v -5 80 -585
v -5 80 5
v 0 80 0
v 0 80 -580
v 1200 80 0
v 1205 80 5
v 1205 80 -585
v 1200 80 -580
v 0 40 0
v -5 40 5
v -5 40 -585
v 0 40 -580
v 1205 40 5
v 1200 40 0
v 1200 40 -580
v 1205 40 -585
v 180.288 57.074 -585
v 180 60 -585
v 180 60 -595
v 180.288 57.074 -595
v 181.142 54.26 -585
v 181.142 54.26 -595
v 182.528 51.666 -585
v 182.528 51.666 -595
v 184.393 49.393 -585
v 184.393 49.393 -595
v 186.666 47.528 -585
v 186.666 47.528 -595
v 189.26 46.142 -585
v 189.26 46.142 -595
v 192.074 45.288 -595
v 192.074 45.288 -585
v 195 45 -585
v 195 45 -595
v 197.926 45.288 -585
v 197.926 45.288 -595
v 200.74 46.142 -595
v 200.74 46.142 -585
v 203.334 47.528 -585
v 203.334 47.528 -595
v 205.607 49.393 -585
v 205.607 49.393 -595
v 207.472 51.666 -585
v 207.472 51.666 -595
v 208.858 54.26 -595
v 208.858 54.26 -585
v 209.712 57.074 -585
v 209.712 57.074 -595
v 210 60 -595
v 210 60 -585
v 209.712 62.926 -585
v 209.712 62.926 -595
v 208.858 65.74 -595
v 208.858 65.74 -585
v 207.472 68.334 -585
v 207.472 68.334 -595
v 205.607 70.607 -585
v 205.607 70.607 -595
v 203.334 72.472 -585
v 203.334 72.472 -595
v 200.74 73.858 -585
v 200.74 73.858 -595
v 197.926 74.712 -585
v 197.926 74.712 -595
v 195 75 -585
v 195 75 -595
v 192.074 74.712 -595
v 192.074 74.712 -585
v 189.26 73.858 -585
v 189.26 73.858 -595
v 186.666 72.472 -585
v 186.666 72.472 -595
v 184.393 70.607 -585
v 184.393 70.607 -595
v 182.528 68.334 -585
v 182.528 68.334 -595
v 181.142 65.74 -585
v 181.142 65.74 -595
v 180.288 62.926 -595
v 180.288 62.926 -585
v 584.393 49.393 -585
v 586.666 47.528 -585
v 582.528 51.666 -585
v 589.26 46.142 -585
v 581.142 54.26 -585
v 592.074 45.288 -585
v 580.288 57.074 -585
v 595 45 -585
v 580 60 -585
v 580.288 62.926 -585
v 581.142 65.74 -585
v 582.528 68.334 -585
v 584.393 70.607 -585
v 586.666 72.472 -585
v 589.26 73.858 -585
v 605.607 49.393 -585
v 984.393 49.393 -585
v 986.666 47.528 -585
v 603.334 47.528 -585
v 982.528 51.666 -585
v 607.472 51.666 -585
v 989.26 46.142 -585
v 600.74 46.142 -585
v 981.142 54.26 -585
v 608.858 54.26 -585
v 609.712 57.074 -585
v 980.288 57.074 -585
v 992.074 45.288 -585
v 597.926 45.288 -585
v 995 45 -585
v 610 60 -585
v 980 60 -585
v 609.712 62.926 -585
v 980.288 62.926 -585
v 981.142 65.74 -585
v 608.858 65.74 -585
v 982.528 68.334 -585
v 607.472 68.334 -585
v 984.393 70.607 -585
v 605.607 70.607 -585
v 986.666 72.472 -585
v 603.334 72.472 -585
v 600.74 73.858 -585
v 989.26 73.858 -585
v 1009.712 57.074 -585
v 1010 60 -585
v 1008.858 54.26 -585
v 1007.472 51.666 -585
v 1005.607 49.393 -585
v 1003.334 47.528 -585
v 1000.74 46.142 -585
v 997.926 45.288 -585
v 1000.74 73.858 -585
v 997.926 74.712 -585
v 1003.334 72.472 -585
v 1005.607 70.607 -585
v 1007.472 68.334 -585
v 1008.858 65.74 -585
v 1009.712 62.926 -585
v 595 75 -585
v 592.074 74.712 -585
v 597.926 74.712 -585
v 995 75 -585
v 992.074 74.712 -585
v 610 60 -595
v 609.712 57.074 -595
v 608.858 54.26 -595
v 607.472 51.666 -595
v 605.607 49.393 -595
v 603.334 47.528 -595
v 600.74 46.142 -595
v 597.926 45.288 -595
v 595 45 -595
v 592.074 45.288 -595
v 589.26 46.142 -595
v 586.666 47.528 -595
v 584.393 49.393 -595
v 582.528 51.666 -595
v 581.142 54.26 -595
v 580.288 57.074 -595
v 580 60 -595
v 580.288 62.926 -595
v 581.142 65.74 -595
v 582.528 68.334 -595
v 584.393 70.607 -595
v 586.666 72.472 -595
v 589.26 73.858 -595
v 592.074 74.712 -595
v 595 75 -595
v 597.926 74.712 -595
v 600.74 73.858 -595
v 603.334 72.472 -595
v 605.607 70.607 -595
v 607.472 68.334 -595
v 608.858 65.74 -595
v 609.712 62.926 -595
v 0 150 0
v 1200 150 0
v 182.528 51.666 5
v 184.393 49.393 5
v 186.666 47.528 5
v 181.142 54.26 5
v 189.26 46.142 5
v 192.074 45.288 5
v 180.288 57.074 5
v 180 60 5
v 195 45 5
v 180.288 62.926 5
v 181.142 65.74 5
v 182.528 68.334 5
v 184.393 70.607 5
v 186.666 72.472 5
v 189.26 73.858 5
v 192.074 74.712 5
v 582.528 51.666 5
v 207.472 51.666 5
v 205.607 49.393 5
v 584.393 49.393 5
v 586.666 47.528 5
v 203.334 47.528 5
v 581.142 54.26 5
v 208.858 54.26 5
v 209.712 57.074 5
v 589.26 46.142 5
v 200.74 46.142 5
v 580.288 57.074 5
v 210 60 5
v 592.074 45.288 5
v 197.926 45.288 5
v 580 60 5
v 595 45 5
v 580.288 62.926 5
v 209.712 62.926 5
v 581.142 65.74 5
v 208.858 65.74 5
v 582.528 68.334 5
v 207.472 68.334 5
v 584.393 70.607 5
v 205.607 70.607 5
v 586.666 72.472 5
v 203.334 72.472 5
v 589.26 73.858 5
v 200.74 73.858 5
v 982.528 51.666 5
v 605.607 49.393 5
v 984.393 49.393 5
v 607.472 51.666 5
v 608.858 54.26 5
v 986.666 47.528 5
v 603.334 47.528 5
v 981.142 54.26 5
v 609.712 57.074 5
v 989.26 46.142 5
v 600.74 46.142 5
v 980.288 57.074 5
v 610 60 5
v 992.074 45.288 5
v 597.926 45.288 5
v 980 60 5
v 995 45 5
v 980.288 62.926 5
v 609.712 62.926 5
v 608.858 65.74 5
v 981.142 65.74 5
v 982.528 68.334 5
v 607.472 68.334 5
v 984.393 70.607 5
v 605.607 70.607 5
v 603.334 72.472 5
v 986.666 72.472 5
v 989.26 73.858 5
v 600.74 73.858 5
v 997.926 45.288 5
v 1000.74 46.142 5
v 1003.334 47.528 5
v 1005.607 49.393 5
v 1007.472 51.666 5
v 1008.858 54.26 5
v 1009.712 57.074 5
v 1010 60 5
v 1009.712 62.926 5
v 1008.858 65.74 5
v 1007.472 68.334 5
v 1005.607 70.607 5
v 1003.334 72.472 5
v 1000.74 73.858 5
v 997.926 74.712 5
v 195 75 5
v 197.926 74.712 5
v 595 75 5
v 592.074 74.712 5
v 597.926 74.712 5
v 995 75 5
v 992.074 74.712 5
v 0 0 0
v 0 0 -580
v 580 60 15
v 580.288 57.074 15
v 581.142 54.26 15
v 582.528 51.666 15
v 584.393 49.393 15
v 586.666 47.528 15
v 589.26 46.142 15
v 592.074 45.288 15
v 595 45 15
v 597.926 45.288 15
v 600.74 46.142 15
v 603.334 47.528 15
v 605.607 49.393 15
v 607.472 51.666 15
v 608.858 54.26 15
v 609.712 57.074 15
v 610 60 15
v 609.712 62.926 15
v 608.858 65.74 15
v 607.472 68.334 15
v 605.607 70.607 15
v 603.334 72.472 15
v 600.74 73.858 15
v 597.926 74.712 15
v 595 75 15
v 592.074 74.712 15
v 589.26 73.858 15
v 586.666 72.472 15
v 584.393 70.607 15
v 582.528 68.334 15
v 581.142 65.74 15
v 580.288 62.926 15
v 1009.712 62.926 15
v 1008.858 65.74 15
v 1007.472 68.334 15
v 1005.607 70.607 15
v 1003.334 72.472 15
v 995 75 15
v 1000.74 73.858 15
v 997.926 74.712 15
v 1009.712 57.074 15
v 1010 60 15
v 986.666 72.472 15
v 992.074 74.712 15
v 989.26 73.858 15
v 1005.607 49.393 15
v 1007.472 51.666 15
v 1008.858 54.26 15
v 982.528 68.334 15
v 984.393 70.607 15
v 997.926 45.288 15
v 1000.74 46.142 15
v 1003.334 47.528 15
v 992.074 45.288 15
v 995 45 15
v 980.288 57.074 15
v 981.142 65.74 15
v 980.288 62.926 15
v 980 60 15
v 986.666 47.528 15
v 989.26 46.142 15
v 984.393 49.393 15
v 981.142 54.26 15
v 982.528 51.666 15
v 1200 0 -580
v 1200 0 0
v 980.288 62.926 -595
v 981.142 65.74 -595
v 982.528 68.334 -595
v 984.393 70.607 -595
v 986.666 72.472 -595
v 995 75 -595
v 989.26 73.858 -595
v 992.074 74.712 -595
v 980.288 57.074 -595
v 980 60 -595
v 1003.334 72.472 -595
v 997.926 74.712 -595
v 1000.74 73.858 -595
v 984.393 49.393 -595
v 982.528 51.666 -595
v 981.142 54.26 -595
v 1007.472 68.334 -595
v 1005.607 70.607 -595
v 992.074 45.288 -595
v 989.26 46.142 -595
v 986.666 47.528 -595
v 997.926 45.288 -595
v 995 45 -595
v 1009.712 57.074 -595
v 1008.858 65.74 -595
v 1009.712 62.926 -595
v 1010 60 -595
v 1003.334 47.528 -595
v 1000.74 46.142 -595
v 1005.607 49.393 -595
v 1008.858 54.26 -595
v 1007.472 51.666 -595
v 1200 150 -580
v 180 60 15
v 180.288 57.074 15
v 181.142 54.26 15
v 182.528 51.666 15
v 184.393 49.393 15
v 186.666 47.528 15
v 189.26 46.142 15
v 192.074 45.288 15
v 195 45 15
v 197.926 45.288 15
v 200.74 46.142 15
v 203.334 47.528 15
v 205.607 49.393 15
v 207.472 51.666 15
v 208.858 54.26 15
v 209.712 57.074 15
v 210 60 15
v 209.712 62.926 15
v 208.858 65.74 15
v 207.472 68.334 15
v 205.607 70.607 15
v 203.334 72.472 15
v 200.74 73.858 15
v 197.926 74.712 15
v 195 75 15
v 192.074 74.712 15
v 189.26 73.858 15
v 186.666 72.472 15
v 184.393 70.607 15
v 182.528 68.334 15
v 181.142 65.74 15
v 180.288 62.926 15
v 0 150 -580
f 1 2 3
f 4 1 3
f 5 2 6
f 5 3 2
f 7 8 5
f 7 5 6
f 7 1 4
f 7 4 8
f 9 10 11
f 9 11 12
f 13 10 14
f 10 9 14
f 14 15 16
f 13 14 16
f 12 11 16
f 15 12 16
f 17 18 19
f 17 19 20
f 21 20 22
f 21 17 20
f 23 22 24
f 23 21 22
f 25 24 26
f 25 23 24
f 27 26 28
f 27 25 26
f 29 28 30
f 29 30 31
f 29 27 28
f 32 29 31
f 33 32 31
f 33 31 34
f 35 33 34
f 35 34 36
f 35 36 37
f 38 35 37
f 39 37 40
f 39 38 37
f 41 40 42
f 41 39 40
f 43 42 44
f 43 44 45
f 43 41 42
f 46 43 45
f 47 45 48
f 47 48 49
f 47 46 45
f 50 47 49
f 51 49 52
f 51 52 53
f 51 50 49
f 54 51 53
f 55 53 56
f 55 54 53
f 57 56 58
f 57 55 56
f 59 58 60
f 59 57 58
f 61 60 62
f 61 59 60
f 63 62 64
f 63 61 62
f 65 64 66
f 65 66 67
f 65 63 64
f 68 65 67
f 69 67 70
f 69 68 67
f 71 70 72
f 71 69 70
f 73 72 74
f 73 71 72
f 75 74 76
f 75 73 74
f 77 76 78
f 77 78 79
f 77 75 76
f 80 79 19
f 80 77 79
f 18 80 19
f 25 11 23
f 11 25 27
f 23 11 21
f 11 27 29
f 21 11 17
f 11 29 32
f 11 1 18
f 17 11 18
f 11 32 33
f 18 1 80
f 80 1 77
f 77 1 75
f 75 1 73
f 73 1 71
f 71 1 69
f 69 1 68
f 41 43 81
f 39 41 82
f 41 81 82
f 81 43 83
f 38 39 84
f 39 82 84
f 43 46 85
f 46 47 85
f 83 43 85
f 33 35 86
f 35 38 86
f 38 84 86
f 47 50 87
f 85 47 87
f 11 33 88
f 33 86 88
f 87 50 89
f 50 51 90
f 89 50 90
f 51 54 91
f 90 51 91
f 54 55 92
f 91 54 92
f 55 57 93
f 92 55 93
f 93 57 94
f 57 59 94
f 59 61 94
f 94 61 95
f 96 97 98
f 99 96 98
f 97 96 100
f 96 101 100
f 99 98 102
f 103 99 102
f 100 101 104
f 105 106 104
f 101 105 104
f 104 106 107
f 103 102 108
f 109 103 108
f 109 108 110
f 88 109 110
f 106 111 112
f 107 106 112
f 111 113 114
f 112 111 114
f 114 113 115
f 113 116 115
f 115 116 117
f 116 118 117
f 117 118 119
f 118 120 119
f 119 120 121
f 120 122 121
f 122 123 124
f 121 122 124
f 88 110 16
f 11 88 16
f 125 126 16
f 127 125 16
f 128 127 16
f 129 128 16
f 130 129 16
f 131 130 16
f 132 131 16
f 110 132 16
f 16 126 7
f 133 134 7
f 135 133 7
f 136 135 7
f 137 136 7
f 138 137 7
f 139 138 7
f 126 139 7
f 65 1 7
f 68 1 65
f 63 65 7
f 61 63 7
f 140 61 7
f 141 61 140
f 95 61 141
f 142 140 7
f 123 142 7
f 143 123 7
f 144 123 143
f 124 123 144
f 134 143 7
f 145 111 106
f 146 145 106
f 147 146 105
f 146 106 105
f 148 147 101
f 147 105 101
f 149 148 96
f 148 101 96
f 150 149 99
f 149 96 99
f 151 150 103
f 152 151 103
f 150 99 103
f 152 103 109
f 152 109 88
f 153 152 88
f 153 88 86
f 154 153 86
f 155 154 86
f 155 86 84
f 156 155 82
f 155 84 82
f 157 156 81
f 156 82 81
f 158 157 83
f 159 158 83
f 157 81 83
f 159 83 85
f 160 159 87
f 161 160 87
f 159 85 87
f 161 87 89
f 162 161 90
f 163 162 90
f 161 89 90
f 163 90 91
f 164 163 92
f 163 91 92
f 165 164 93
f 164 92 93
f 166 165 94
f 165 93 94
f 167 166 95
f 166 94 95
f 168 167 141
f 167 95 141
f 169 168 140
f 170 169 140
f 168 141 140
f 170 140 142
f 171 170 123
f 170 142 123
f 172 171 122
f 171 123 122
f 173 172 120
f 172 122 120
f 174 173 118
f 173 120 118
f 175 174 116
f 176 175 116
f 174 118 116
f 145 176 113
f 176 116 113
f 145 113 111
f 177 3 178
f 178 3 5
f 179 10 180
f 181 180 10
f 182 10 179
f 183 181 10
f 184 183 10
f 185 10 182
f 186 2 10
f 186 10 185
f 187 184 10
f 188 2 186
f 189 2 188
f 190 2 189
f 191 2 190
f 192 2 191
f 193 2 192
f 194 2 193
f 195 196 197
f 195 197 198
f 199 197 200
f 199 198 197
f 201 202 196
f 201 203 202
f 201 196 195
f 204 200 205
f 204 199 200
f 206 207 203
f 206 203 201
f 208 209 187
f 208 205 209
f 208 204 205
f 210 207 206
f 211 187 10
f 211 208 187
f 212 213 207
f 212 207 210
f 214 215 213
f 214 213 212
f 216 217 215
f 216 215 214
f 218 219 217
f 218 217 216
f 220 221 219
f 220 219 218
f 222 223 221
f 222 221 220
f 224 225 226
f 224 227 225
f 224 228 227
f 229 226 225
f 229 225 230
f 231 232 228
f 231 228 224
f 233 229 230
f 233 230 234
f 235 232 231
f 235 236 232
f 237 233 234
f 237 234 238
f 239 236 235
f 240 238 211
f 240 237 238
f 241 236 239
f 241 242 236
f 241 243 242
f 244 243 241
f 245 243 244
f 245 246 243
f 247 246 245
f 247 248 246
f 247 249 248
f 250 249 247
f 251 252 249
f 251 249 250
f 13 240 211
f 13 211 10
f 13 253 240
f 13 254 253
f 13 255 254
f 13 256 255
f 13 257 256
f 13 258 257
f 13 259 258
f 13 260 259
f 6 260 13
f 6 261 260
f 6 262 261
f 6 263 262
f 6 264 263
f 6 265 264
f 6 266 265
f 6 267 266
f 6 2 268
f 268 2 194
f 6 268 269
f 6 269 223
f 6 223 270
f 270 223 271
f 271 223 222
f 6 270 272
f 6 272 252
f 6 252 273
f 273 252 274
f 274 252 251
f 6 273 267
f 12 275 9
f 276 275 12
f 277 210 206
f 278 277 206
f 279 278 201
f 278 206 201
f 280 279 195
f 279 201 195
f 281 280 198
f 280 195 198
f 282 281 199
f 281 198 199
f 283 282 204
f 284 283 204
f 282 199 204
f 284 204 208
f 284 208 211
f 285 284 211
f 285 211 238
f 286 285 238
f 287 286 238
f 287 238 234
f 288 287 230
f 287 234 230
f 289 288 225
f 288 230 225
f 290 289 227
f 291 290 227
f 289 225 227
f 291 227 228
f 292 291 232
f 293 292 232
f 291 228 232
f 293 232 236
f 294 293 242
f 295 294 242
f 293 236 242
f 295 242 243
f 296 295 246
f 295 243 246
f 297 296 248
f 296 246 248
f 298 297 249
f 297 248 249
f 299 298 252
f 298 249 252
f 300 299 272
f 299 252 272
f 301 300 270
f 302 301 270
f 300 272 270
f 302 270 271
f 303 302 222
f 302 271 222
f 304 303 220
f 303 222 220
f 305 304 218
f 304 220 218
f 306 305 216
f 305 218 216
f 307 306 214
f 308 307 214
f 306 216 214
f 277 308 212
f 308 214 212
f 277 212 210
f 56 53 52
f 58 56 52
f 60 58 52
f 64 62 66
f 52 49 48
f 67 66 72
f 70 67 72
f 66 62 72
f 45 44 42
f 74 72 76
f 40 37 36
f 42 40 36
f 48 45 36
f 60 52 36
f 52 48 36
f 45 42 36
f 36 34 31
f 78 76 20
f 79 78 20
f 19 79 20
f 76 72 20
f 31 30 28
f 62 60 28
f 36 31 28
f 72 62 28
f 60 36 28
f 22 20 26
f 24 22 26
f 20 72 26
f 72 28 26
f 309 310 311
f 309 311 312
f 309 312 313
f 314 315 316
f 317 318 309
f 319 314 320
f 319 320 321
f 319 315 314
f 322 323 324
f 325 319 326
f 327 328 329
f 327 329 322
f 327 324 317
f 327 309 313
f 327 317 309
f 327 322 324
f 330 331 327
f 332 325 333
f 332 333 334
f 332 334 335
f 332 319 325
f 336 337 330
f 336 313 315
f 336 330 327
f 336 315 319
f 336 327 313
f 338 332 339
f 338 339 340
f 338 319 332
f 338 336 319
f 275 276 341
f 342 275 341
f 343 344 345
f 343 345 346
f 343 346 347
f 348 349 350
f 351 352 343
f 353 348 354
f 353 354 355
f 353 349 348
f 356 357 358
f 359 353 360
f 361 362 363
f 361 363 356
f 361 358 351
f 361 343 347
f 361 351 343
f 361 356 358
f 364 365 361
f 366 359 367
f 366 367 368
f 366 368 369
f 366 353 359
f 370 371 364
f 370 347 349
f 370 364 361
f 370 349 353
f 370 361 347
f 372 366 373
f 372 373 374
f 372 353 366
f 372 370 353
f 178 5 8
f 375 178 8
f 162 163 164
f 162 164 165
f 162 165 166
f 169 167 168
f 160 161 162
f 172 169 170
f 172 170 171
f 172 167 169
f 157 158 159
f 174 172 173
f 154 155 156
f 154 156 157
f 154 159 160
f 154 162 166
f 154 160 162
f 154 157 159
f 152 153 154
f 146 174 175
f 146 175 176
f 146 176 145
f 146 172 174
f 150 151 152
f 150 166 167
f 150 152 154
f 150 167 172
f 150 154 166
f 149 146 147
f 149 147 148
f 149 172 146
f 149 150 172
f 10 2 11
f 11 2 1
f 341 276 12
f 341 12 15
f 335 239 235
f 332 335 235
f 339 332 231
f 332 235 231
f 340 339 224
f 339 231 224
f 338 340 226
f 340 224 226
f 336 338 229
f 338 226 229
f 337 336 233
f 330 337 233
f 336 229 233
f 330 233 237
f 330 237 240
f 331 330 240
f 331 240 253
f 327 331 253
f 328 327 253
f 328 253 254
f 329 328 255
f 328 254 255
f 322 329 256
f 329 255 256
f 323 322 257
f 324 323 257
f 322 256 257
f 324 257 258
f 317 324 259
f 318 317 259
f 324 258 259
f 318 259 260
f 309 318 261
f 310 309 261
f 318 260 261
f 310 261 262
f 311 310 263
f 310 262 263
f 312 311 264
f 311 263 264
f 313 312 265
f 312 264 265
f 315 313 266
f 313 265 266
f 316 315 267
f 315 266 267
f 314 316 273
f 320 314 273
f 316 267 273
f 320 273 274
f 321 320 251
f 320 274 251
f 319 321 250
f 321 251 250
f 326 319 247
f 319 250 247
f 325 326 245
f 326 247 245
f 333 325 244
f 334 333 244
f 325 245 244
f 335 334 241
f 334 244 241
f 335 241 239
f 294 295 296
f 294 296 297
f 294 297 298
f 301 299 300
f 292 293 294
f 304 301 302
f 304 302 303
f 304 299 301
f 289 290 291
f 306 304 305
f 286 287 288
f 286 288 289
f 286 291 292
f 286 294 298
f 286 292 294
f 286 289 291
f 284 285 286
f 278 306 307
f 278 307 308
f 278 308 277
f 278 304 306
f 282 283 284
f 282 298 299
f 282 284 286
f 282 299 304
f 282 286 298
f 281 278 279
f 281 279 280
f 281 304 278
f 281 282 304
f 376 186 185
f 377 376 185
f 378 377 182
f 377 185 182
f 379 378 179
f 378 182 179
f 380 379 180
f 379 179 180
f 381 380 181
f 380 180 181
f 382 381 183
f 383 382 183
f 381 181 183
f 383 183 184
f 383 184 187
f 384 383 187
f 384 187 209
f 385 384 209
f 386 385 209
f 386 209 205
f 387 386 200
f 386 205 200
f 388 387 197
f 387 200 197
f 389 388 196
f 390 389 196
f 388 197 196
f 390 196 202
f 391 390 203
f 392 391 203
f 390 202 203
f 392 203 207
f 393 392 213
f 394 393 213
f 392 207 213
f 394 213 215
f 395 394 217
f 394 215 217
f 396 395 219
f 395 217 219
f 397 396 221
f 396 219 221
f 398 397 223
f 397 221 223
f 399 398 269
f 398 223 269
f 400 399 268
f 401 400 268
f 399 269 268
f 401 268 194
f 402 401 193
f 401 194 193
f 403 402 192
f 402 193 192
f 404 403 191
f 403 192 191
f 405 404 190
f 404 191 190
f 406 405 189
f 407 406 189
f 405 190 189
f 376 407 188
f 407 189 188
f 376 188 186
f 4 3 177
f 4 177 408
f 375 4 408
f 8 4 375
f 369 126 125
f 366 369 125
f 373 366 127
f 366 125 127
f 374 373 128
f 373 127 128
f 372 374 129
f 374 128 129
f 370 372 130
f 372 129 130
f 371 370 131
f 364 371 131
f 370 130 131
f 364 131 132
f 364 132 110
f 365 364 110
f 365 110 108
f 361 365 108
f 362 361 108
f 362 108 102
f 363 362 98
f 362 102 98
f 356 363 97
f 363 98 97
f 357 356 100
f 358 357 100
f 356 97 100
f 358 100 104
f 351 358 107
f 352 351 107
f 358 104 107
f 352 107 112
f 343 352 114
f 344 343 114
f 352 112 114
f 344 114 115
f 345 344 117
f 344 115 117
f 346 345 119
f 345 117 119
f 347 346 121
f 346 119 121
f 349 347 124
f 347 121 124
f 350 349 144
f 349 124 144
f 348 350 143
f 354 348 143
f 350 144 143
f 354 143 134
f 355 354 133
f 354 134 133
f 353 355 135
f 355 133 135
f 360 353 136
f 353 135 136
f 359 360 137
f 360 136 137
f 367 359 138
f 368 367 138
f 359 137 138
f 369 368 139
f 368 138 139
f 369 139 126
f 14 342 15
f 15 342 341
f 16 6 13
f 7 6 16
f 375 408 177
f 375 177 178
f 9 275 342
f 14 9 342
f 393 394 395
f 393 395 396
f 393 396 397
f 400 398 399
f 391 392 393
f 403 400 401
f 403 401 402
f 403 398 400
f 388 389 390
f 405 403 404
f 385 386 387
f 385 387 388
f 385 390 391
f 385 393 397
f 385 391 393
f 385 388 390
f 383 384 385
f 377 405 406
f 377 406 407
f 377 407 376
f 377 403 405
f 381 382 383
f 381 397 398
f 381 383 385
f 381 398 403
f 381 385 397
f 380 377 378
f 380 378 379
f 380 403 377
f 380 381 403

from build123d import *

# Parameters (mm, degrees)
SZKIC1_W                    = 1200
SZKIC1_H                    = 580
DODANIE_WYCI_GNI_CIE1_DEPTH = 150
SZKIC2_W                    = 1210
SZKIC2_H                    = 590
SZKIC2_W_2                  = 1200
SZKIC2_H_2                  = 580
DODANIE_WYCI_GNI_CIE2_DEPTH = 20
SZKIC3_R                    = 15
DODANIE_WYCI_GNI_CIE3_DEPTH = 10
SZYK_LINIOWY1_COUNT         = 3
SZYK_LINIOWY1_PITCH         = 400
LUSTRO1_COPY_1_SKETCH_R     = 15
LUSTRO1_COPY_1_DEPTH        = 10
LUSTRO1_COPY_2_SKETCH_R     = 15
LUSTRO1_COPY_2_DEPTH        = 10


with BuildPart() as part:
    # Szkic1 → Dodanie-wyciągnięcie1 (new body)
    with BuildSketch(Plane(origin=(0, 0, 0), x_dir=(1, 0, 0), z_dir=(0, 1, 0))):
        with Locations((600, 290)):
            Rectangle(SZKIC1_W, SZKIC1_H)
    extrude(amount=DODANIE_WYCI_GNI_CIE1_DEPTH)

    # Szkic2 → Dodanie-wyciągnięcie2 (add, symmetric)
    with BuildSketch(Plane(origin=(0, 60, 0), x_dir=(1, 0, 0), z_dir=(0, 1, 0))):
        with Locations((600, 290)):
            Rectangle(SZKIC2_W, SZKIC2_H)
        with Locations((600, 290)):
            Rectangle(SZKIC2_W_2, SZKIC2_H_2, mode=Mode.SUBTRACT)
    extrude(amount=DODANIE_WYCI_GNI_CIE2_DEPTH, both=True)

    # Szkic3 → Dodanie-wyciągnięcie3 (add)
    with BuildSketch(Plane.XY.offset(5)):
        with Locations(Location((195, 60, 0), (0, 0, 180))):
            Circle(SZKIC3_R)
    dodanie_wyci_gni_cie3 = extrude(amount=DODANIE_WYCI_GNI_CIE3_DEPTH)

    # Szyk liniowy1: Dodanie-wyciągnięcie3 ×3
    with Locations(*[(i * SZYK_LINIOWY1_PITCH, 0, 0) for i in range(1, SZYK_LINIOWY1_COUNT)]):
        add(dodanie_wyci_gni_cie3)

    # Lustro1: Dodanie-wyciągnięcie3 across plane
    add(dodanie_wyci_gni_cie3.mirror(Plane.XY.offset(-290)))

    # Lustro1 copy 1 sketch → Lustro1 copy 1 (add)
    with BuildSketch(Plane(origin=(400, 0, -585), x_dir=(1, 0, 0), z_dir=(0, 0, -1))):
        with Locations((195, -60)):
            Circle(LUSTRO1_COPY_1_SKETCH_R)
    extrude(amount=LUSTRO1_COPY_1_DEPTH)

    # Lustro1 copy 2 sketch → Lustro1 copy 2 (add)
    with BuildSketch(Plane(origin=(800, 0, -585), x_dir=(1, 0, 0), z_dir=(0, 0, -1))):
        with Locations((195, -60)):
            Circle(LUSTRO1_COPY_2_SKETCH_R)
    extrude(amount=LUSTRO1_COPY_2_DEPTH)


solid = part.part
